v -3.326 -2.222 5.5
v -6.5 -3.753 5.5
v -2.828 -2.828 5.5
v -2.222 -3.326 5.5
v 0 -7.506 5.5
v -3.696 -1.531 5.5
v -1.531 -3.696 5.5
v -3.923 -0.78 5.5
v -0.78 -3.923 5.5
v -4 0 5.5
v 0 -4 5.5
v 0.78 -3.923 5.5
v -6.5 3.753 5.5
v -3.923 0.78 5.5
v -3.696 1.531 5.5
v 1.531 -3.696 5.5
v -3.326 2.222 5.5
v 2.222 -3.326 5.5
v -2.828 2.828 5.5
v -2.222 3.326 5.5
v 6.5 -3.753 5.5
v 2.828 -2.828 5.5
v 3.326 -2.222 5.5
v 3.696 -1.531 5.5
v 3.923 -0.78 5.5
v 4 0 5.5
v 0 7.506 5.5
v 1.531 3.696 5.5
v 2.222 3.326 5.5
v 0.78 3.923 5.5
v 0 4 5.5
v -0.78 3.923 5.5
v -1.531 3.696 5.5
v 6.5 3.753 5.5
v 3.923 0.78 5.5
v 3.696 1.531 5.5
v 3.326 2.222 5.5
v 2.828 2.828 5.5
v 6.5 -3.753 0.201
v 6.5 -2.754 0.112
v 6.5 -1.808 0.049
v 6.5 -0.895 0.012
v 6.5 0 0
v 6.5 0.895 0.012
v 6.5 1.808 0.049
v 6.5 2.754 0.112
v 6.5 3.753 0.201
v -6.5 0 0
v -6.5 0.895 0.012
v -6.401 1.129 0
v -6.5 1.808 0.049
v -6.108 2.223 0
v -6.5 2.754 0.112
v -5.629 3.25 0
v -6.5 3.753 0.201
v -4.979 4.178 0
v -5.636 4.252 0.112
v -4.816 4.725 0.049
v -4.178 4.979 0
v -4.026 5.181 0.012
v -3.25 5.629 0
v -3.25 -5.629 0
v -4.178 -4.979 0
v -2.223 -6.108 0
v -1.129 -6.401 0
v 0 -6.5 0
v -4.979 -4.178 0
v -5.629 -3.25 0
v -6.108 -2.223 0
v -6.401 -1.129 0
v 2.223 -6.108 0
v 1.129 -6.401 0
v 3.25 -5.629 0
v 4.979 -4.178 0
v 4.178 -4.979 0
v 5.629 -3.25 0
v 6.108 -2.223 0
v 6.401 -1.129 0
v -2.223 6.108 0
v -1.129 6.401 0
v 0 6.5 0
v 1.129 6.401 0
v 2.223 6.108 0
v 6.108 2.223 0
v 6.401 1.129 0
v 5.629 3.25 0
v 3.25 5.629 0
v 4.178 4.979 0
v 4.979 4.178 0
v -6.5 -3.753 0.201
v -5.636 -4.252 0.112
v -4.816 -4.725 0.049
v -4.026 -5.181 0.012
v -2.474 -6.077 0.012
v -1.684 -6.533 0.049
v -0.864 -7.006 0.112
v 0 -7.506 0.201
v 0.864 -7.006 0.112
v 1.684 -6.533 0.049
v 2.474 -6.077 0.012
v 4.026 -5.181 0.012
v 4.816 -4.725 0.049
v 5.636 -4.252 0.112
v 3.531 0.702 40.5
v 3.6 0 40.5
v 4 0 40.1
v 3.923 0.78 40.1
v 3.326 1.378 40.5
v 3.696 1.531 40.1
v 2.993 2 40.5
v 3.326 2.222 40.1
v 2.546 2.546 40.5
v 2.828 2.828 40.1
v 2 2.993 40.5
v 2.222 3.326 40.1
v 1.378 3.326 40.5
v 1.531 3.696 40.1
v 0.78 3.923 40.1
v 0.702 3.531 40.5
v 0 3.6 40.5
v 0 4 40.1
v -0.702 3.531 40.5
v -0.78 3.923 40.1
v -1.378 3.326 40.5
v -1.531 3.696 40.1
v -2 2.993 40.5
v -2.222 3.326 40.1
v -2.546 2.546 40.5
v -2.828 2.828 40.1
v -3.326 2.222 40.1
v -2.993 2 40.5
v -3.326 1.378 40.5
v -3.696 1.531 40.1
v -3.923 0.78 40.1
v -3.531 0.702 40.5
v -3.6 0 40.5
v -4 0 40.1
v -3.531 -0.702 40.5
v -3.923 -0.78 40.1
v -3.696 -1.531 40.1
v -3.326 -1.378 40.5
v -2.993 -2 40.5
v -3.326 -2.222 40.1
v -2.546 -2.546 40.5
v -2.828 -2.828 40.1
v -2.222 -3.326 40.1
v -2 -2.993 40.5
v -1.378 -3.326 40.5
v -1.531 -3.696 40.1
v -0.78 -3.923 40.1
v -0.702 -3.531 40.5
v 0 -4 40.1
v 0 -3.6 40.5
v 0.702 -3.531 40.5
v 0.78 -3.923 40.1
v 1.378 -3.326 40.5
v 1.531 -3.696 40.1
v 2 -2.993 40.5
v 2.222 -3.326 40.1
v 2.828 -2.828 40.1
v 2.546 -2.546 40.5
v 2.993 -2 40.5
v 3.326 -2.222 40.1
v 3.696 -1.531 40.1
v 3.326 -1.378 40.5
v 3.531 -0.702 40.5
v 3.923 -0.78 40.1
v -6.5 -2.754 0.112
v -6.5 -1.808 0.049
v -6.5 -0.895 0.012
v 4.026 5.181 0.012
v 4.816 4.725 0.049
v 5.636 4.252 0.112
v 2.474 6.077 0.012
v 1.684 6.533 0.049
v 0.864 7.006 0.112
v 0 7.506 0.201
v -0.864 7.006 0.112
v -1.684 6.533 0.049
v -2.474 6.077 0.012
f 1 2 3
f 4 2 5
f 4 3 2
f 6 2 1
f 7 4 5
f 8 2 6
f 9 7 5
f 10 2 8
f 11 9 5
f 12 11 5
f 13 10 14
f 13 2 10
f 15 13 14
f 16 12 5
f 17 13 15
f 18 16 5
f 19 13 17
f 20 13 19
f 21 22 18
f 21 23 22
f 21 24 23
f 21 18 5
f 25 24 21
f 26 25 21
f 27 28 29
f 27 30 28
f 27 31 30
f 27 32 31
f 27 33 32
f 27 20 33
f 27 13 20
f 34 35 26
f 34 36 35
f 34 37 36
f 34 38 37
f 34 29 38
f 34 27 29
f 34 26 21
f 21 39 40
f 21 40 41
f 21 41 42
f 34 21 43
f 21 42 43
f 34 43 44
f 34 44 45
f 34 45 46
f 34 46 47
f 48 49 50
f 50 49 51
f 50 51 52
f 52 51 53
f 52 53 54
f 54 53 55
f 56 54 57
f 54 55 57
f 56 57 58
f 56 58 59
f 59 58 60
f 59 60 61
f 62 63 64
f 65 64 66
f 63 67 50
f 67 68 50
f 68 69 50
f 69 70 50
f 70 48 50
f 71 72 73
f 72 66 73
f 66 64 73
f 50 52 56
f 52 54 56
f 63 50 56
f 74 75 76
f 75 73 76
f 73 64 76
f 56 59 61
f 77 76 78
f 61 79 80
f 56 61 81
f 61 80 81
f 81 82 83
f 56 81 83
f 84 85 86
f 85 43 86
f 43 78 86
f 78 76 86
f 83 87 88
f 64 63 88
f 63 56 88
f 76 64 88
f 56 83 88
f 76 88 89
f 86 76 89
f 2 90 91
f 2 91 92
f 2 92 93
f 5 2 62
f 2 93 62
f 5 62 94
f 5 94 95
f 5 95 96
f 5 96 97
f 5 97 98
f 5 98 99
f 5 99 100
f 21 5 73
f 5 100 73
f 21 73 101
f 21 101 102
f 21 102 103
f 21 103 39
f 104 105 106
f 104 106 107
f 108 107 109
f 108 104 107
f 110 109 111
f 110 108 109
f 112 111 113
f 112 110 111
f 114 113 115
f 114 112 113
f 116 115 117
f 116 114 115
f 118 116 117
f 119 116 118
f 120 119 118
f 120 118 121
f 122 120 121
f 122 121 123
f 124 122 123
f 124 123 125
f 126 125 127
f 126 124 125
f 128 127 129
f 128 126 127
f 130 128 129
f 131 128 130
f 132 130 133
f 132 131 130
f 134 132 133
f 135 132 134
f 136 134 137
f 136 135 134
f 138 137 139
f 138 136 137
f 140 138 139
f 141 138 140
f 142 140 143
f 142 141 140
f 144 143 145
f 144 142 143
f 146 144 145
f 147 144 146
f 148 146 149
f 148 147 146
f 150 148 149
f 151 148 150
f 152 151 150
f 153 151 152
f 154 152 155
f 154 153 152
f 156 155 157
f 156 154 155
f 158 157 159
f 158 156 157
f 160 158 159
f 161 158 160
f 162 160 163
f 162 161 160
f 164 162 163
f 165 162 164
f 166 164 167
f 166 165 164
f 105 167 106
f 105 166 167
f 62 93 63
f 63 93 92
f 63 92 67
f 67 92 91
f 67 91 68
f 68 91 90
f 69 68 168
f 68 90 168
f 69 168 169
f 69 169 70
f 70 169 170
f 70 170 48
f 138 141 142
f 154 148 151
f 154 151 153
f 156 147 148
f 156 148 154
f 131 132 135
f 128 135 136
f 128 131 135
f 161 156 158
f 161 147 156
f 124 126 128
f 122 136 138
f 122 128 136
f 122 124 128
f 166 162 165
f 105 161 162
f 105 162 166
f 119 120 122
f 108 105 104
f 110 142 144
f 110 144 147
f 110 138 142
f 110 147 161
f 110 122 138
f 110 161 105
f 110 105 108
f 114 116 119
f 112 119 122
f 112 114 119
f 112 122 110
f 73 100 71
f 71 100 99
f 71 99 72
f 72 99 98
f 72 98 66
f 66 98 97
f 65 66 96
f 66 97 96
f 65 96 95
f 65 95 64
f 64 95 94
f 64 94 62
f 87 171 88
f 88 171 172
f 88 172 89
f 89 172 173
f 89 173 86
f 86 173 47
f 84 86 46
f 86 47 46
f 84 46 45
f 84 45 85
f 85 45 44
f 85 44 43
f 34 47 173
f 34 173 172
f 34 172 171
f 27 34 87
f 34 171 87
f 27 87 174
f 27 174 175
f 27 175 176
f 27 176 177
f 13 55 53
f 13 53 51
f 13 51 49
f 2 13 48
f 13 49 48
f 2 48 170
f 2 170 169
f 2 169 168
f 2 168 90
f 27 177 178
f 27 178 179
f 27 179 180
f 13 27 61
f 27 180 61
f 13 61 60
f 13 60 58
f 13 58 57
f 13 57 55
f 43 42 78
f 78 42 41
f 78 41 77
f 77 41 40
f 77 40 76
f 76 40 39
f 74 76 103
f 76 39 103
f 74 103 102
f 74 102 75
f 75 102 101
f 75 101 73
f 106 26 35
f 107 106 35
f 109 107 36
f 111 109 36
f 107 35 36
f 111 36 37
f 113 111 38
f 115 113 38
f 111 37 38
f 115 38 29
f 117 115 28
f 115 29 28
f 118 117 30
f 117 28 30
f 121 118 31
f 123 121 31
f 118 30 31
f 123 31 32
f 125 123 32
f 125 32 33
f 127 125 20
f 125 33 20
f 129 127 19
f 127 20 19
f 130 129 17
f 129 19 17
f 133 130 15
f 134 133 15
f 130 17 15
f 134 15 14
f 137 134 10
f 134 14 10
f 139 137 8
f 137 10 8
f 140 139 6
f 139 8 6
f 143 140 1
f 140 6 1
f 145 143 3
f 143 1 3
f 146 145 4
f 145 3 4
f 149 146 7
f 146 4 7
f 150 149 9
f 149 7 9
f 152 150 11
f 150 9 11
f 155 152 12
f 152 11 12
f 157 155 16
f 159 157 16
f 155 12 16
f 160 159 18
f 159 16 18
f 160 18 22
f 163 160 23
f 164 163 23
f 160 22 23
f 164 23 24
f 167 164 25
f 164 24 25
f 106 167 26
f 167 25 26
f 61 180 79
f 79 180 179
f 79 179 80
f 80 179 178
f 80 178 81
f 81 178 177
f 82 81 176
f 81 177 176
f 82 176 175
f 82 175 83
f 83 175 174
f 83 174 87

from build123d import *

# Parameters (mm, degrees)
F1_DEPTH = 5.5
F2_R     = 4
F3_DEPTH = 35
F4_SIZE  = 0.4


with BuildPart() as f1:
    # F0 (on Top) → F1 (new body)
    with BuildSketch(Plane.XY):
        Polygon((6.5, 3.752777), (0, 7.505553), (-6.5, 3.752777), (-6.5, -3.752777), (0, -7.505553), (6.5, -3.752777), align=None)
    extrude(amount=F1_DEPTH)

    # F2 (on face) → F3 (join)
    with BuildSketch(Plane.XY.offset(5.5)):
        Circle(F2_R)
    extrude(amount=F3_DEPTH)

    # F4
    f4_edges = [f1.edges().sort_by_distance(p)[0] for p in [
        (-4, 0, 40.5),
    ]]
    chamfer(f4_edges, length=F4_SIZE)

    # F5 (on Front) → F6 (revolve, cut)
    with BuildSketch(Plane.XZ):
        Polygon((-11.5, 1), (-11.5, 0), (-6.5, 0), align=None)
    revolve(axis=Axis((0, 0, 5.5), (0, 0, -1)), mode=Mode.SUBTRACT)


solid = f1.part
